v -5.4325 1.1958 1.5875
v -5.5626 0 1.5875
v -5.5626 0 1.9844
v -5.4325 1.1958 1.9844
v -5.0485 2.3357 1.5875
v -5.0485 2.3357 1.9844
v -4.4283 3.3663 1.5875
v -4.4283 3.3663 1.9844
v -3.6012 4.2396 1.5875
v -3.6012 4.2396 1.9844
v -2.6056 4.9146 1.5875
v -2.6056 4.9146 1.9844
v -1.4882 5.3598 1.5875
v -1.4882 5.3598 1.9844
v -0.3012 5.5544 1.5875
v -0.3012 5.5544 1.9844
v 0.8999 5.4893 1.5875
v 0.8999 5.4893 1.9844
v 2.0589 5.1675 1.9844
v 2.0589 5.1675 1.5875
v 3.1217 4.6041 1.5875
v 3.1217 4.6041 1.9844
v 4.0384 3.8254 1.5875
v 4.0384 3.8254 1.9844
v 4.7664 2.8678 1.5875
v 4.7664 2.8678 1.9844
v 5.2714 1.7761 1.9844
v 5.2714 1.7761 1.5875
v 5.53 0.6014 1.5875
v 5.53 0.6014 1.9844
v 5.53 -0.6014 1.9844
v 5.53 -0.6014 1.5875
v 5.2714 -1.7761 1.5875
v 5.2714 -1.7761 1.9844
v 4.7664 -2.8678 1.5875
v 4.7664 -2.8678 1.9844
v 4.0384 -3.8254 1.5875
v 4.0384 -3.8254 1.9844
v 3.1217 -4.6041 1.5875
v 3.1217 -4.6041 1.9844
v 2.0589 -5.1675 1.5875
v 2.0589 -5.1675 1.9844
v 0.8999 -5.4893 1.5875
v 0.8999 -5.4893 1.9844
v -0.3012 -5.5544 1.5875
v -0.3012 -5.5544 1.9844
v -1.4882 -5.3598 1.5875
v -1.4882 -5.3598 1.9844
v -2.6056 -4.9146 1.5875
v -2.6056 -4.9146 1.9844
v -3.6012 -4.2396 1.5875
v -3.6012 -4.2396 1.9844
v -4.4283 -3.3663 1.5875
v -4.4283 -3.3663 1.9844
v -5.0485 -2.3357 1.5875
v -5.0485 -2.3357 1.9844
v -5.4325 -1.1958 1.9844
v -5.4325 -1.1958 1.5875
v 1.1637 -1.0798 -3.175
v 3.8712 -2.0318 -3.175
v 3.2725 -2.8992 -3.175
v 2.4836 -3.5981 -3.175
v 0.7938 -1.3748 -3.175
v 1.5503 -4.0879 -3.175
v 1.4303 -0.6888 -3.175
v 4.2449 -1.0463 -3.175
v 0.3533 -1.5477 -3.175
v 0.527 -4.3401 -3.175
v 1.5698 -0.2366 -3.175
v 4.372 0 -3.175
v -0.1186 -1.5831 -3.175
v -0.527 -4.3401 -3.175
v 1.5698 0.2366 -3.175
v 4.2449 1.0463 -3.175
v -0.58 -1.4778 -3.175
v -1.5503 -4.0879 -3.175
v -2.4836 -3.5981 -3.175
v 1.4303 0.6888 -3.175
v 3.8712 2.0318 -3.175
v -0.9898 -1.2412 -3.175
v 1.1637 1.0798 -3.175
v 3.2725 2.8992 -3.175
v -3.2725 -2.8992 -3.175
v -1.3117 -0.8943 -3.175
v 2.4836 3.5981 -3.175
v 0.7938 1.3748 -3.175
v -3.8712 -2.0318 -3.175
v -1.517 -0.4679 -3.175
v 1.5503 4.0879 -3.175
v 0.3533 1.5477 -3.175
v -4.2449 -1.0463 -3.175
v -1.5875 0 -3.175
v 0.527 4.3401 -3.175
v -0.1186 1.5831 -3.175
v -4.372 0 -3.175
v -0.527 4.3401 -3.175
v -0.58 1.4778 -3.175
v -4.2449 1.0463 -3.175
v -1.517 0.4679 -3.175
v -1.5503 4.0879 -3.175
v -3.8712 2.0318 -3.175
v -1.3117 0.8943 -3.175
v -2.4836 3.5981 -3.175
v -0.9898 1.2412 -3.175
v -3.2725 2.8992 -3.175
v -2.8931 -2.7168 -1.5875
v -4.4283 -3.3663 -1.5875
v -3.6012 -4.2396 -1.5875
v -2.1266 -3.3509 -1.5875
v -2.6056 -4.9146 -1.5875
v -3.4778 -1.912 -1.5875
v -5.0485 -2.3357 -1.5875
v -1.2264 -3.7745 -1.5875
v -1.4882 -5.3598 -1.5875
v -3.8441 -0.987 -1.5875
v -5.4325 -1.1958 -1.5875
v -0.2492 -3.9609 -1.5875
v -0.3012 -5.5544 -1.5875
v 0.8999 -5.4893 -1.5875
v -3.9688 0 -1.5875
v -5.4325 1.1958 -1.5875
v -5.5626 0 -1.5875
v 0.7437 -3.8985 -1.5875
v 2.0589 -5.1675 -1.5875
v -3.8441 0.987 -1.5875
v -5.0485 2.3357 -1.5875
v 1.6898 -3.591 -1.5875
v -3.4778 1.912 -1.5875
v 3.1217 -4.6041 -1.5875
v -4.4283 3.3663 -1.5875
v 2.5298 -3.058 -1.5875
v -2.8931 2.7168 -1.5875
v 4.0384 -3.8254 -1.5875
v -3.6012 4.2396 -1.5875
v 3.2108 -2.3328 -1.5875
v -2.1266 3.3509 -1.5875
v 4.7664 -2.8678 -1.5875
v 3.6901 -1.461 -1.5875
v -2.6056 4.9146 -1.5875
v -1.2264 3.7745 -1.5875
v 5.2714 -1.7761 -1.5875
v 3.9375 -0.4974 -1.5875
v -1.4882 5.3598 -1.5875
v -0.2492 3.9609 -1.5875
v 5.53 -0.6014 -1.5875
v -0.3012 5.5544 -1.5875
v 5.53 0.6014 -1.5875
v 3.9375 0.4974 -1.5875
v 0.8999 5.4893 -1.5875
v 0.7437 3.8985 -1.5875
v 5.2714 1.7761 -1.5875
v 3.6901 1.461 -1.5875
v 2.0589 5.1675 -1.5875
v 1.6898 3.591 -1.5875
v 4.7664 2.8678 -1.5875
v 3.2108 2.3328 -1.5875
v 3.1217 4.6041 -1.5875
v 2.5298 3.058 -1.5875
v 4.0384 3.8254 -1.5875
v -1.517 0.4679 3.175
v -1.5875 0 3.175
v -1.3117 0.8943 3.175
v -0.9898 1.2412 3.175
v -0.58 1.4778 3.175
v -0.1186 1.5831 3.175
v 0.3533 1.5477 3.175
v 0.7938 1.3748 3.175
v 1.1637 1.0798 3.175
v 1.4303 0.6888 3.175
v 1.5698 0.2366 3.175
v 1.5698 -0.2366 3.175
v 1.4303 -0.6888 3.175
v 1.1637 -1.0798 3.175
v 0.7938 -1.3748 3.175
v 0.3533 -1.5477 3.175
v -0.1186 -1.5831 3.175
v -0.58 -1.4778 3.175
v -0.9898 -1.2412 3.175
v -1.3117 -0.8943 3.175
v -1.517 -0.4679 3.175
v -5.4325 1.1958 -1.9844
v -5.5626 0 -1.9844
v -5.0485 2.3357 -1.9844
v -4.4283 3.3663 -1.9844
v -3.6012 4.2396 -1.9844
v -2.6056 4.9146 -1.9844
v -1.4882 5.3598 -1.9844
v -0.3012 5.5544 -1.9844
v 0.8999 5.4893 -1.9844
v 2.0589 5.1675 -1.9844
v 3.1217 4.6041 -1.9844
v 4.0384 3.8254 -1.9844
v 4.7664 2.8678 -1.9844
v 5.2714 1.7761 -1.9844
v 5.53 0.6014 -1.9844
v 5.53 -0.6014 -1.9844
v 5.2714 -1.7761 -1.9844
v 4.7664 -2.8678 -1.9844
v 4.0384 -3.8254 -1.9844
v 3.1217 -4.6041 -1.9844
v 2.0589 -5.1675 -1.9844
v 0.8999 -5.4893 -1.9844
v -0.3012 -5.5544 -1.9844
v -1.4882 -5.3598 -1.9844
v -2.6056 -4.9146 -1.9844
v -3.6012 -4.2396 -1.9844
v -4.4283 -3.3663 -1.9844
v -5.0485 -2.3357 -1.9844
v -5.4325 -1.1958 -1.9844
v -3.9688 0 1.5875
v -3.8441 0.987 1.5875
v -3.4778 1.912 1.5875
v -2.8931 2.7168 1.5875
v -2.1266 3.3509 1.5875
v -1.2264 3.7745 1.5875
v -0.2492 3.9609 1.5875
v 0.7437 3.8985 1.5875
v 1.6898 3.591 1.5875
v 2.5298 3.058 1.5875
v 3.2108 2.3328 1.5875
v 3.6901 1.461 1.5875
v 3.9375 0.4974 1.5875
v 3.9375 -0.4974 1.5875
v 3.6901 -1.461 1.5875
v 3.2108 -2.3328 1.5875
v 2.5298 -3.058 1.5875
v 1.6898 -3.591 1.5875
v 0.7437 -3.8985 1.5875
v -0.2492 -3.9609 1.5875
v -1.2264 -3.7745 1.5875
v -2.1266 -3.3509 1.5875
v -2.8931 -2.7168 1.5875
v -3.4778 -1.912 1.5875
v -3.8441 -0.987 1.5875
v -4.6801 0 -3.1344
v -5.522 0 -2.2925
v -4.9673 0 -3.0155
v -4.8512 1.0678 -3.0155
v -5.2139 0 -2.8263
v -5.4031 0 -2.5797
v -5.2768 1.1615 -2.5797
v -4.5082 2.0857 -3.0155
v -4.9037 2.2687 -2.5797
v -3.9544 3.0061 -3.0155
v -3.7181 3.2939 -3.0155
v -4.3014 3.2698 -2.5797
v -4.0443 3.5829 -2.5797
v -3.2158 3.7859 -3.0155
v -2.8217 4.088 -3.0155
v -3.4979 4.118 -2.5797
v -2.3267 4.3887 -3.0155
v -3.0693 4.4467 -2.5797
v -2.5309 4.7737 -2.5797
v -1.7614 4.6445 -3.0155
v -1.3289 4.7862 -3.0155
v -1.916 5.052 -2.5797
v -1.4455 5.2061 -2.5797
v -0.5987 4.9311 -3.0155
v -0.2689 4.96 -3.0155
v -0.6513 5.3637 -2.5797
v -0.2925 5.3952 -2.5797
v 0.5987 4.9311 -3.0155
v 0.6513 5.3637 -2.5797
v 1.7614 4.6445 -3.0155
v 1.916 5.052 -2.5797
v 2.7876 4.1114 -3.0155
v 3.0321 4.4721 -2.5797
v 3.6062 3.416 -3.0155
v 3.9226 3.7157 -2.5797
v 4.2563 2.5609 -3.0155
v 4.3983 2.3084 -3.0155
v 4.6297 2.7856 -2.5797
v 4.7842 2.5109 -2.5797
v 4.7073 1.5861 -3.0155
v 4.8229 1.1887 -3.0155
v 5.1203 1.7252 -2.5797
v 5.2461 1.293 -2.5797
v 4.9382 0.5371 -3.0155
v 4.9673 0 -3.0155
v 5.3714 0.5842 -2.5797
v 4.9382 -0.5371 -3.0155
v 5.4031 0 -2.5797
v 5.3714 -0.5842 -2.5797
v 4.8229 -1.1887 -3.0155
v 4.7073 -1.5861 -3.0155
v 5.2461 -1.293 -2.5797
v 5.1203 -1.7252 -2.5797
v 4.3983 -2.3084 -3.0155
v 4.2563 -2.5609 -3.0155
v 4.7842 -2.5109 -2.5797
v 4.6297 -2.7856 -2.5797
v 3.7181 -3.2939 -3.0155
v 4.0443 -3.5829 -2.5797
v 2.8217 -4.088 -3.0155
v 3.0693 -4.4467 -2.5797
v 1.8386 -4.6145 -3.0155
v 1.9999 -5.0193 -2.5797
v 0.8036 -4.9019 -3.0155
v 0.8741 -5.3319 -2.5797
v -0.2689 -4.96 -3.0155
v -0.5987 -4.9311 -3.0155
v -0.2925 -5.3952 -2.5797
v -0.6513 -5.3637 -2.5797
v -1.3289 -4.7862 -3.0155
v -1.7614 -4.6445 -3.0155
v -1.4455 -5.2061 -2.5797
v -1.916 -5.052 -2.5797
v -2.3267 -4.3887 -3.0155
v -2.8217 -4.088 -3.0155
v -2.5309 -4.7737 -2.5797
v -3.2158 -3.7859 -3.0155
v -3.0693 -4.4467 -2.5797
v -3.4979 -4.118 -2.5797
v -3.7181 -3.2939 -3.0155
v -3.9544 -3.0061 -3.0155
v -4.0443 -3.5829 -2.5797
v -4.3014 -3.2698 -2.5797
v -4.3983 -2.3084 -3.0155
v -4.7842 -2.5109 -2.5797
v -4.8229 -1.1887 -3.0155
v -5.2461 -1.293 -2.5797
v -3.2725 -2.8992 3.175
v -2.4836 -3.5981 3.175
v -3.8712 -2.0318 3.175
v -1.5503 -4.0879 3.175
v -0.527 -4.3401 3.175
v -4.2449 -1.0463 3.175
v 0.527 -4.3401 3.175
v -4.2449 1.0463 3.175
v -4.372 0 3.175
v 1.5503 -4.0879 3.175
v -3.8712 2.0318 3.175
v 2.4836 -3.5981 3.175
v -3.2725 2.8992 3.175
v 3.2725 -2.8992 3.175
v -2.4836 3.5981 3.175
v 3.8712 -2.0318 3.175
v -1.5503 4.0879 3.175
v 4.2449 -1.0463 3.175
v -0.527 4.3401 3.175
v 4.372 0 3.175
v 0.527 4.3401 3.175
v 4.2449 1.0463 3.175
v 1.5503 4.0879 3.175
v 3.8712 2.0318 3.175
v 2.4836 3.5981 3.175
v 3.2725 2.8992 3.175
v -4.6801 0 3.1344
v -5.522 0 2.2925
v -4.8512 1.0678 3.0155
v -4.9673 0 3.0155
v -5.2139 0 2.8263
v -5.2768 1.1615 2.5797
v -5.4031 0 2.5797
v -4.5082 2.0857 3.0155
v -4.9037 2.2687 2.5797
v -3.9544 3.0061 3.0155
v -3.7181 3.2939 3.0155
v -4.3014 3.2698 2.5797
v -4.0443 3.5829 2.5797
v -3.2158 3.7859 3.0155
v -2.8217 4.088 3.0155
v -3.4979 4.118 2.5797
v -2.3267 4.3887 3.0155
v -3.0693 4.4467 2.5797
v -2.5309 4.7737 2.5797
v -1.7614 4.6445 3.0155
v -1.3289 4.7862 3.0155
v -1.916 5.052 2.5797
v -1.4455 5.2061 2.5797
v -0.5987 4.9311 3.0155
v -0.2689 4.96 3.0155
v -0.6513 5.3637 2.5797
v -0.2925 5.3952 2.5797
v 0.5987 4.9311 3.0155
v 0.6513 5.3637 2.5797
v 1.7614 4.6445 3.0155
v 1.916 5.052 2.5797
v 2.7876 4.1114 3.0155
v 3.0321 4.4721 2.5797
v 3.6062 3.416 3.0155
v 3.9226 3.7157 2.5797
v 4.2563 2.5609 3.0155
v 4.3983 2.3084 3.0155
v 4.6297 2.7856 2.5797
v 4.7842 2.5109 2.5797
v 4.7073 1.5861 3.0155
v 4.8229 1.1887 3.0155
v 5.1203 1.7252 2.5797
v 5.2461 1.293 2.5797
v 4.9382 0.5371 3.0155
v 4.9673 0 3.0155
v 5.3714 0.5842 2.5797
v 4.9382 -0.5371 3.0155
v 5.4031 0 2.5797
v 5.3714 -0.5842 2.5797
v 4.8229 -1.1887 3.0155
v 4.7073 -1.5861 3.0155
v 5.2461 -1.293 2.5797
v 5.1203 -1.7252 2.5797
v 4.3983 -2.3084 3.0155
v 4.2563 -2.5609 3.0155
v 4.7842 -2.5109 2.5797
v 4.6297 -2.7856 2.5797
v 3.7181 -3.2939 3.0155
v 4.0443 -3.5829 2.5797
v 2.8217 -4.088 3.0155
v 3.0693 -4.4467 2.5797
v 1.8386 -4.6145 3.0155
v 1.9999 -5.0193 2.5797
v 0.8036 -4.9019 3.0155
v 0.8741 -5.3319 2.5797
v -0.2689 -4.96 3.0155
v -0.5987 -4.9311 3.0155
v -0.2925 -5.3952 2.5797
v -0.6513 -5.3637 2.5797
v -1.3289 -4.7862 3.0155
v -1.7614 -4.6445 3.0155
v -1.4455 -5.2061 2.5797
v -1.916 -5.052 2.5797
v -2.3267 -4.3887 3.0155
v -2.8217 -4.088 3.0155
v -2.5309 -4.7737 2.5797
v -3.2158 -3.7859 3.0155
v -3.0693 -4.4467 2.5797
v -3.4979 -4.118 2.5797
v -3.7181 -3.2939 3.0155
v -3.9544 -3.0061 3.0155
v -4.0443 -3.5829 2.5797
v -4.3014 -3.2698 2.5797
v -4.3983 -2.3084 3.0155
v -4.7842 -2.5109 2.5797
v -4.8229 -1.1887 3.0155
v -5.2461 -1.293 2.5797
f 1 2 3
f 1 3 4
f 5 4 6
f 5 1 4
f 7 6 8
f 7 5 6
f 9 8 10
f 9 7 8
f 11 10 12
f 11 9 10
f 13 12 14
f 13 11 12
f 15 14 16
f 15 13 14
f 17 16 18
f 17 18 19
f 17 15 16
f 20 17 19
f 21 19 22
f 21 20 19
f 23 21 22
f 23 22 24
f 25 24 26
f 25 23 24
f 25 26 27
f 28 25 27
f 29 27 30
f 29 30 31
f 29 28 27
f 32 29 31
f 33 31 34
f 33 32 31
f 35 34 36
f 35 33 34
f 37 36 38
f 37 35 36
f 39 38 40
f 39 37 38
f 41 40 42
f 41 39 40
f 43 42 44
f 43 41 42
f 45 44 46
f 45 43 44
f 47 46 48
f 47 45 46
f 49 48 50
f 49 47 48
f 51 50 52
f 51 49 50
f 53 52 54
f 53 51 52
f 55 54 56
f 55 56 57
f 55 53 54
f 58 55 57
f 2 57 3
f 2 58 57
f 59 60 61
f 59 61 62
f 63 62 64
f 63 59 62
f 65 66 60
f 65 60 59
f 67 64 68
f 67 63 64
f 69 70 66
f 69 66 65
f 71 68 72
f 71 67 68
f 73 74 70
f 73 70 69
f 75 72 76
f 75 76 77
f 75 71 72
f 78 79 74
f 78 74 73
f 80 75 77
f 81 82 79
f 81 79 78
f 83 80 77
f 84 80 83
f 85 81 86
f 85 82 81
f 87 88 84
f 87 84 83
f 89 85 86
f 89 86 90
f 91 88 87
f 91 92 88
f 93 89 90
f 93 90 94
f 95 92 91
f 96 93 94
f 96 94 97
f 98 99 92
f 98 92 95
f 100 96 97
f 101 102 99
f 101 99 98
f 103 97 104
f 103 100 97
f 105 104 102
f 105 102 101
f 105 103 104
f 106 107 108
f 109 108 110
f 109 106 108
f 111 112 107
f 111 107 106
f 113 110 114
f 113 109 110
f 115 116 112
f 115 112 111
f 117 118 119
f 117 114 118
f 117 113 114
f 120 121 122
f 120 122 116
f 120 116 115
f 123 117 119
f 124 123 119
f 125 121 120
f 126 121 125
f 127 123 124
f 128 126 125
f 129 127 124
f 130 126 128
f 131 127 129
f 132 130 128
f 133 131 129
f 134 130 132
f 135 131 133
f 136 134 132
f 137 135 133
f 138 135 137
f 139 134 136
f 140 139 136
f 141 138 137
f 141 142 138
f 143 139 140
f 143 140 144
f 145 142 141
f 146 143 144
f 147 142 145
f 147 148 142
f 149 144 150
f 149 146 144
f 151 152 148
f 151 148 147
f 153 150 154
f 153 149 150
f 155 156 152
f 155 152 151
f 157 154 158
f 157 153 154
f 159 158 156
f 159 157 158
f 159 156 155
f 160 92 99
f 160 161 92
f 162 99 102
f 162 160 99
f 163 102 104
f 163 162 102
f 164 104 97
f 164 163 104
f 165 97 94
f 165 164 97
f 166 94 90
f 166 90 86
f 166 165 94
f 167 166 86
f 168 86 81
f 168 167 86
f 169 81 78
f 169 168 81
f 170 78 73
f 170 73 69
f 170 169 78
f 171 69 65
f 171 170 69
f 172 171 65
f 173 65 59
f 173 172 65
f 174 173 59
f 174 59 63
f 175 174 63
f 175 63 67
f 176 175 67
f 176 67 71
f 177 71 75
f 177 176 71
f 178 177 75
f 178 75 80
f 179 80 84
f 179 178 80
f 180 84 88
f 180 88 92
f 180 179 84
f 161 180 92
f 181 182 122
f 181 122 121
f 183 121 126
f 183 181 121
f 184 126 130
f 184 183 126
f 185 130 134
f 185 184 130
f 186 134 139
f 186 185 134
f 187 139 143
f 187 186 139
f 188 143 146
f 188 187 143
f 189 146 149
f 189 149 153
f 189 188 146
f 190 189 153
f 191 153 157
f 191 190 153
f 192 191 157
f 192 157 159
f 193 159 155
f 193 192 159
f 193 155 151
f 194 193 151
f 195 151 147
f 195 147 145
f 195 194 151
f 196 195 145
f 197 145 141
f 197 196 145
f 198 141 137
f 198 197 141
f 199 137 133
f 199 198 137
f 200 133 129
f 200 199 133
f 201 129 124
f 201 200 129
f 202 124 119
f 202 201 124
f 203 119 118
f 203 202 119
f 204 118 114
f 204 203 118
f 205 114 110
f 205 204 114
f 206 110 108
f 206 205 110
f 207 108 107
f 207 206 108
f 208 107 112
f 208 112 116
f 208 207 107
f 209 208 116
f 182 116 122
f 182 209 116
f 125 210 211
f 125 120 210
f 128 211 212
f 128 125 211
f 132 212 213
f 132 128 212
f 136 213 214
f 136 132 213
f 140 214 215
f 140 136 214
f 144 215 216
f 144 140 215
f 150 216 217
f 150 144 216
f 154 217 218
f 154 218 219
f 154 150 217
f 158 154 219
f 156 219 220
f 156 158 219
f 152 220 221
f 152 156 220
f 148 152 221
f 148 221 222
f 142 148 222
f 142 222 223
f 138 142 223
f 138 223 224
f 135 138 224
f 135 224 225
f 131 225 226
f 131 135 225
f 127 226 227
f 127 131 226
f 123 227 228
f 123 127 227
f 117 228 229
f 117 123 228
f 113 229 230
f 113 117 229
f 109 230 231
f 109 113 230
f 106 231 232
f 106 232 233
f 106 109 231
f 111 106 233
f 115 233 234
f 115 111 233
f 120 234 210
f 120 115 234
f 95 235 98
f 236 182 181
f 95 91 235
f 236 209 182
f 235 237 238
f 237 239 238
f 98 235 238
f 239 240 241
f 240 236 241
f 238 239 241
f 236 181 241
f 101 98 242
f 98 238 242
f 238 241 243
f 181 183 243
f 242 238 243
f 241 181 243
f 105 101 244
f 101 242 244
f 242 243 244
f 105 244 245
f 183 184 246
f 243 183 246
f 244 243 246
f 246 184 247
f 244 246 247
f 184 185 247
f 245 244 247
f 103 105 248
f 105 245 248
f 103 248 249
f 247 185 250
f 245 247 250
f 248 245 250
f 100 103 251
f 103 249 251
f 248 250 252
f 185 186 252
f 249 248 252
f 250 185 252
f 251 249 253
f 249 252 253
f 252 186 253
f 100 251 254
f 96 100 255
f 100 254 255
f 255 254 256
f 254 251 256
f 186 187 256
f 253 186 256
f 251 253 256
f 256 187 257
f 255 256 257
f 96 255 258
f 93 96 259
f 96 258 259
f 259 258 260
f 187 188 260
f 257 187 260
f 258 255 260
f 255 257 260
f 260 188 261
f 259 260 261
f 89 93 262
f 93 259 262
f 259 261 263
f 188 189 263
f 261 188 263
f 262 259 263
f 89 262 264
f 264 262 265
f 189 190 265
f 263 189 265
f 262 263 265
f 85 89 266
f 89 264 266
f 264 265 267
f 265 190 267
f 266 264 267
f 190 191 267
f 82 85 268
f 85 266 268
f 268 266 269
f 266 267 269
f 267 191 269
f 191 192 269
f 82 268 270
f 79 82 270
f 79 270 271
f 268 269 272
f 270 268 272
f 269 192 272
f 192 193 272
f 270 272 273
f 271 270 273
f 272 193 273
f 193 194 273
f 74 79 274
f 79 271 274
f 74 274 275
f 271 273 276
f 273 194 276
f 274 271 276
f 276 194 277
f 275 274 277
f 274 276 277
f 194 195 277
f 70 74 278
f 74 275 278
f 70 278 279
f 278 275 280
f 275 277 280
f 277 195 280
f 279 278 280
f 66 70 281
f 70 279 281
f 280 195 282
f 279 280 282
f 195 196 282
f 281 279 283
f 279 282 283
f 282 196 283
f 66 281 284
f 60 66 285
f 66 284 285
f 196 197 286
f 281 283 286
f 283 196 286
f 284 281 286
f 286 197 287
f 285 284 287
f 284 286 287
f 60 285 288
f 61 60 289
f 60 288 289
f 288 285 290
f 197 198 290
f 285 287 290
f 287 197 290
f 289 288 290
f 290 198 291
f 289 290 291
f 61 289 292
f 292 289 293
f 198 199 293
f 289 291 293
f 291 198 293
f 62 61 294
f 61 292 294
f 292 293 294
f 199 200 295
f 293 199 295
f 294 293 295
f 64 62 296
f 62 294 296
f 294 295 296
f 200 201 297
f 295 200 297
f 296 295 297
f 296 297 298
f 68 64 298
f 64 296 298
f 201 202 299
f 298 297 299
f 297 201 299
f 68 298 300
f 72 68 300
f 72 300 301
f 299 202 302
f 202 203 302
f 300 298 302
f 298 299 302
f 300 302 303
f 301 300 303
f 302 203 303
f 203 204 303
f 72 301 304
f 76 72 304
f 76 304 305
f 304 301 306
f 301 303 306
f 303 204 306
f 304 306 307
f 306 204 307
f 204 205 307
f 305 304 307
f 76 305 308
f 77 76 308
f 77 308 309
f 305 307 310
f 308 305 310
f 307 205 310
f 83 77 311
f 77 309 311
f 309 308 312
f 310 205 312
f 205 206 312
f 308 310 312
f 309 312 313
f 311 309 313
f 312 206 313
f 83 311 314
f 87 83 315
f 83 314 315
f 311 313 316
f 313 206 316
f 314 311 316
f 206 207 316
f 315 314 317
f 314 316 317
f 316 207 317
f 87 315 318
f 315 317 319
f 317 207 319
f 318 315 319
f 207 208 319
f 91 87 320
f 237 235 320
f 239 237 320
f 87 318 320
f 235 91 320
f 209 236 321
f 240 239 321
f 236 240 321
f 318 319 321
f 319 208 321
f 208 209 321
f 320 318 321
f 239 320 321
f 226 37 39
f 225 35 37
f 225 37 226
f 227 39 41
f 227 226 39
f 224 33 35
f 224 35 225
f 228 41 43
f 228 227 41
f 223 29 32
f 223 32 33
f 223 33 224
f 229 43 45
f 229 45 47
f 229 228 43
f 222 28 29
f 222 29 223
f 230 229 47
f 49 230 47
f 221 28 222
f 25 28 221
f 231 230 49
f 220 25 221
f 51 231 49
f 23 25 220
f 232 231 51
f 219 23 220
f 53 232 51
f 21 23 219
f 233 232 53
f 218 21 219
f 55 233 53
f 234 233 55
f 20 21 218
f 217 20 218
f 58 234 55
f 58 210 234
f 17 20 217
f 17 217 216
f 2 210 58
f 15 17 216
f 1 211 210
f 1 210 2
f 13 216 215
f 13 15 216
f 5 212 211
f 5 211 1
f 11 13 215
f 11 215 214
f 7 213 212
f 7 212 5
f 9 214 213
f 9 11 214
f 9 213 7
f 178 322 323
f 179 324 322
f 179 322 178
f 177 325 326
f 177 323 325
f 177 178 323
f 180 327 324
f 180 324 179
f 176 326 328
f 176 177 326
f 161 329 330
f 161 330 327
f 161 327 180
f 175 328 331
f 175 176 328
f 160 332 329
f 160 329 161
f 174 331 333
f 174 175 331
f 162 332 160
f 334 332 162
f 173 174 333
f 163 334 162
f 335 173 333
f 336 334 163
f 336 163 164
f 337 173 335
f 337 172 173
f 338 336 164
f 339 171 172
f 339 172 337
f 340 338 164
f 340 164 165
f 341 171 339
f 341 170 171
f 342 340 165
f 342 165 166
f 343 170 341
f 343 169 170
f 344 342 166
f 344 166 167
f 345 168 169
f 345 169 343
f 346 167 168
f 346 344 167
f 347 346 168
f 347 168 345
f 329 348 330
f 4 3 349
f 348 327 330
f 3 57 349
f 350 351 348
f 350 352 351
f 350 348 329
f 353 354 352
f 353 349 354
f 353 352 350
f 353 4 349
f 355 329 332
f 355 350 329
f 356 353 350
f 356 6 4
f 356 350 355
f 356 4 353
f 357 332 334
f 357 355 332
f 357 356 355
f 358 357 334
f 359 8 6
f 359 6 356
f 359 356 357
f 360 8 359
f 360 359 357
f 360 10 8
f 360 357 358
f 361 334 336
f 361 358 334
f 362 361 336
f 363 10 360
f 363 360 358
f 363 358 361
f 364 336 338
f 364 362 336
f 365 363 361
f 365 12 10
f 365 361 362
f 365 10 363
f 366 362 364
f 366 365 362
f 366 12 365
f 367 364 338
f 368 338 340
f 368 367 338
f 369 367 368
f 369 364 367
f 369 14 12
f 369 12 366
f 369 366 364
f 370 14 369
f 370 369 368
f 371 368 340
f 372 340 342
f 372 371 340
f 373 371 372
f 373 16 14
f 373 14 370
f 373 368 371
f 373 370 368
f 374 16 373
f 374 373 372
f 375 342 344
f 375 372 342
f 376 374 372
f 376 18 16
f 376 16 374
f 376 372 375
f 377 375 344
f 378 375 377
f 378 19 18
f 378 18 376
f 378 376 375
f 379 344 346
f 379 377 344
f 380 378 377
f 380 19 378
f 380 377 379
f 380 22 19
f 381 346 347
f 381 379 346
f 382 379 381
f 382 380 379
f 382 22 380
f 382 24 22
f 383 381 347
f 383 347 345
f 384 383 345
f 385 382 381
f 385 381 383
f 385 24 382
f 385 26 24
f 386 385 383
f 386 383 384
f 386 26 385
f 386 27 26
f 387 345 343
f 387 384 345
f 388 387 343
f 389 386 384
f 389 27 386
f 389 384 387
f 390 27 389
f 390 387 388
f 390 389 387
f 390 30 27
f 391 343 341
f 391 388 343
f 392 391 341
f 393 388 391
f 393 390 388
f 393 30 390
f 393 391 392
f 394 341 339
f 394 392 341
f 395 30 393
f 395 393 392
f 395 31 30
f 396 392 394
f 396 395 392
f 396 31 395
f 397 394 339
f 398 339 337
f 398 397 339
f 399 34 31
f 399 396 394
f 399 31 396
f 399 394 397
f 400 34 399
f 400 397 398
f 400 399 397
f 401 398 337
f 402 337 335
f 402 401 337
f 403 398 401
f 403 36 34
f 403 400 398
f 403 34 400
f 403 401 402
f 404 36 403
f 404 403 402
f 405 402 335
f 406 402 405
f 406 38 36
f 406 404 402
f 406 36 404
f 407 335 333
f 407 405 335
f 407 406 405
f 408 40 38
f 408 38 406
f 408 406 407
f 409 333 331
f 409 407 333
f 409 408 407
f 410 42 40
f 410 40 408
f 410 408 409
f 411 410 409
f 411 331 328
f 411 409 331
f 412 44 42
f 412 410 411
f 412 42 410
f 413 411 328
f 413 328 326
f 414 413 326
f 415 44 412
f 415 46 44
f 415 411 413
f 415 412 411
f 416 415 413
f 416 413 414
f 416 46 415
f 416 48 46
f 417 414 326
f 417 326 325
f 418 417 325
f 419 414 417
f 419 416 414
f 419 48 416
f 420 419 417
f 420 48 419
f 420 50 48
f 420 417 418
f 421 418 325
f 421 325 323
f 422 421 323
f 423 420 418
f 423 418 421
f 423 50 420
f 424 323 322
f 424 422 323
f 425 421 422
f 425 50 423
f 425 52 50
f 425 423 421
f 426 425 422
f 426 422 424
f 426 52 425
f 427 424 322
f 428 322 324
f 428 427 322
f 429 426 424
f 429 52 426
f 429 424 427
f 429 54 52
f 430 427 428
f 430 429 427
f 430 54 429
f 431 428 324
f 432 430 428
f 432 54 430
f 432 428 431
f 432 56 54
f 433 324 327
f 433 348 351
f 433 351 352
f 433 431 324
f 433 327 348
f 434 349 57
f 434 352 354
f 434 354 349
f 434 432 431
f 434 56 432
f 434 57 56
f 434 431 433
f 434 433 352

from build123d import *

# Parameters (mm, degrees)
F4_R = 1.190625
F5_R = 1.190625


with BuildPart() as f3:
    # F2 (on Front) → F3 (revolve)
    with BuildSketch(Plane.XZ):
        Polygon((-1.5875, -3.175), (-1.5875, 3.175), (-5.5626, 3.175), (-5.5626, 1.5875), (-3.96875, 1.5875), (-3.96875, -1.5875), (-5.5626, -1.5875), (-5.5626, -3.175), align=None)
    revolve(axis=Axis((0, 0, 0.0240590106), (0, 0, -1)))

    # F4
    f4_edges = [f3.edges().sort_by_distance(p)[0] for p in [
        (5.5626, 0, 3.175),
    ]]
    fillet(f4_edges, radius=F4_R)

    # F5
    f5_edges = [f3.edges().sort_by_distance(p)[0] for p in [
        (5.5626, 0, -3.175),
    ]]
    fillet(f5_edges, radius=F5_R)


solid = f3.part
